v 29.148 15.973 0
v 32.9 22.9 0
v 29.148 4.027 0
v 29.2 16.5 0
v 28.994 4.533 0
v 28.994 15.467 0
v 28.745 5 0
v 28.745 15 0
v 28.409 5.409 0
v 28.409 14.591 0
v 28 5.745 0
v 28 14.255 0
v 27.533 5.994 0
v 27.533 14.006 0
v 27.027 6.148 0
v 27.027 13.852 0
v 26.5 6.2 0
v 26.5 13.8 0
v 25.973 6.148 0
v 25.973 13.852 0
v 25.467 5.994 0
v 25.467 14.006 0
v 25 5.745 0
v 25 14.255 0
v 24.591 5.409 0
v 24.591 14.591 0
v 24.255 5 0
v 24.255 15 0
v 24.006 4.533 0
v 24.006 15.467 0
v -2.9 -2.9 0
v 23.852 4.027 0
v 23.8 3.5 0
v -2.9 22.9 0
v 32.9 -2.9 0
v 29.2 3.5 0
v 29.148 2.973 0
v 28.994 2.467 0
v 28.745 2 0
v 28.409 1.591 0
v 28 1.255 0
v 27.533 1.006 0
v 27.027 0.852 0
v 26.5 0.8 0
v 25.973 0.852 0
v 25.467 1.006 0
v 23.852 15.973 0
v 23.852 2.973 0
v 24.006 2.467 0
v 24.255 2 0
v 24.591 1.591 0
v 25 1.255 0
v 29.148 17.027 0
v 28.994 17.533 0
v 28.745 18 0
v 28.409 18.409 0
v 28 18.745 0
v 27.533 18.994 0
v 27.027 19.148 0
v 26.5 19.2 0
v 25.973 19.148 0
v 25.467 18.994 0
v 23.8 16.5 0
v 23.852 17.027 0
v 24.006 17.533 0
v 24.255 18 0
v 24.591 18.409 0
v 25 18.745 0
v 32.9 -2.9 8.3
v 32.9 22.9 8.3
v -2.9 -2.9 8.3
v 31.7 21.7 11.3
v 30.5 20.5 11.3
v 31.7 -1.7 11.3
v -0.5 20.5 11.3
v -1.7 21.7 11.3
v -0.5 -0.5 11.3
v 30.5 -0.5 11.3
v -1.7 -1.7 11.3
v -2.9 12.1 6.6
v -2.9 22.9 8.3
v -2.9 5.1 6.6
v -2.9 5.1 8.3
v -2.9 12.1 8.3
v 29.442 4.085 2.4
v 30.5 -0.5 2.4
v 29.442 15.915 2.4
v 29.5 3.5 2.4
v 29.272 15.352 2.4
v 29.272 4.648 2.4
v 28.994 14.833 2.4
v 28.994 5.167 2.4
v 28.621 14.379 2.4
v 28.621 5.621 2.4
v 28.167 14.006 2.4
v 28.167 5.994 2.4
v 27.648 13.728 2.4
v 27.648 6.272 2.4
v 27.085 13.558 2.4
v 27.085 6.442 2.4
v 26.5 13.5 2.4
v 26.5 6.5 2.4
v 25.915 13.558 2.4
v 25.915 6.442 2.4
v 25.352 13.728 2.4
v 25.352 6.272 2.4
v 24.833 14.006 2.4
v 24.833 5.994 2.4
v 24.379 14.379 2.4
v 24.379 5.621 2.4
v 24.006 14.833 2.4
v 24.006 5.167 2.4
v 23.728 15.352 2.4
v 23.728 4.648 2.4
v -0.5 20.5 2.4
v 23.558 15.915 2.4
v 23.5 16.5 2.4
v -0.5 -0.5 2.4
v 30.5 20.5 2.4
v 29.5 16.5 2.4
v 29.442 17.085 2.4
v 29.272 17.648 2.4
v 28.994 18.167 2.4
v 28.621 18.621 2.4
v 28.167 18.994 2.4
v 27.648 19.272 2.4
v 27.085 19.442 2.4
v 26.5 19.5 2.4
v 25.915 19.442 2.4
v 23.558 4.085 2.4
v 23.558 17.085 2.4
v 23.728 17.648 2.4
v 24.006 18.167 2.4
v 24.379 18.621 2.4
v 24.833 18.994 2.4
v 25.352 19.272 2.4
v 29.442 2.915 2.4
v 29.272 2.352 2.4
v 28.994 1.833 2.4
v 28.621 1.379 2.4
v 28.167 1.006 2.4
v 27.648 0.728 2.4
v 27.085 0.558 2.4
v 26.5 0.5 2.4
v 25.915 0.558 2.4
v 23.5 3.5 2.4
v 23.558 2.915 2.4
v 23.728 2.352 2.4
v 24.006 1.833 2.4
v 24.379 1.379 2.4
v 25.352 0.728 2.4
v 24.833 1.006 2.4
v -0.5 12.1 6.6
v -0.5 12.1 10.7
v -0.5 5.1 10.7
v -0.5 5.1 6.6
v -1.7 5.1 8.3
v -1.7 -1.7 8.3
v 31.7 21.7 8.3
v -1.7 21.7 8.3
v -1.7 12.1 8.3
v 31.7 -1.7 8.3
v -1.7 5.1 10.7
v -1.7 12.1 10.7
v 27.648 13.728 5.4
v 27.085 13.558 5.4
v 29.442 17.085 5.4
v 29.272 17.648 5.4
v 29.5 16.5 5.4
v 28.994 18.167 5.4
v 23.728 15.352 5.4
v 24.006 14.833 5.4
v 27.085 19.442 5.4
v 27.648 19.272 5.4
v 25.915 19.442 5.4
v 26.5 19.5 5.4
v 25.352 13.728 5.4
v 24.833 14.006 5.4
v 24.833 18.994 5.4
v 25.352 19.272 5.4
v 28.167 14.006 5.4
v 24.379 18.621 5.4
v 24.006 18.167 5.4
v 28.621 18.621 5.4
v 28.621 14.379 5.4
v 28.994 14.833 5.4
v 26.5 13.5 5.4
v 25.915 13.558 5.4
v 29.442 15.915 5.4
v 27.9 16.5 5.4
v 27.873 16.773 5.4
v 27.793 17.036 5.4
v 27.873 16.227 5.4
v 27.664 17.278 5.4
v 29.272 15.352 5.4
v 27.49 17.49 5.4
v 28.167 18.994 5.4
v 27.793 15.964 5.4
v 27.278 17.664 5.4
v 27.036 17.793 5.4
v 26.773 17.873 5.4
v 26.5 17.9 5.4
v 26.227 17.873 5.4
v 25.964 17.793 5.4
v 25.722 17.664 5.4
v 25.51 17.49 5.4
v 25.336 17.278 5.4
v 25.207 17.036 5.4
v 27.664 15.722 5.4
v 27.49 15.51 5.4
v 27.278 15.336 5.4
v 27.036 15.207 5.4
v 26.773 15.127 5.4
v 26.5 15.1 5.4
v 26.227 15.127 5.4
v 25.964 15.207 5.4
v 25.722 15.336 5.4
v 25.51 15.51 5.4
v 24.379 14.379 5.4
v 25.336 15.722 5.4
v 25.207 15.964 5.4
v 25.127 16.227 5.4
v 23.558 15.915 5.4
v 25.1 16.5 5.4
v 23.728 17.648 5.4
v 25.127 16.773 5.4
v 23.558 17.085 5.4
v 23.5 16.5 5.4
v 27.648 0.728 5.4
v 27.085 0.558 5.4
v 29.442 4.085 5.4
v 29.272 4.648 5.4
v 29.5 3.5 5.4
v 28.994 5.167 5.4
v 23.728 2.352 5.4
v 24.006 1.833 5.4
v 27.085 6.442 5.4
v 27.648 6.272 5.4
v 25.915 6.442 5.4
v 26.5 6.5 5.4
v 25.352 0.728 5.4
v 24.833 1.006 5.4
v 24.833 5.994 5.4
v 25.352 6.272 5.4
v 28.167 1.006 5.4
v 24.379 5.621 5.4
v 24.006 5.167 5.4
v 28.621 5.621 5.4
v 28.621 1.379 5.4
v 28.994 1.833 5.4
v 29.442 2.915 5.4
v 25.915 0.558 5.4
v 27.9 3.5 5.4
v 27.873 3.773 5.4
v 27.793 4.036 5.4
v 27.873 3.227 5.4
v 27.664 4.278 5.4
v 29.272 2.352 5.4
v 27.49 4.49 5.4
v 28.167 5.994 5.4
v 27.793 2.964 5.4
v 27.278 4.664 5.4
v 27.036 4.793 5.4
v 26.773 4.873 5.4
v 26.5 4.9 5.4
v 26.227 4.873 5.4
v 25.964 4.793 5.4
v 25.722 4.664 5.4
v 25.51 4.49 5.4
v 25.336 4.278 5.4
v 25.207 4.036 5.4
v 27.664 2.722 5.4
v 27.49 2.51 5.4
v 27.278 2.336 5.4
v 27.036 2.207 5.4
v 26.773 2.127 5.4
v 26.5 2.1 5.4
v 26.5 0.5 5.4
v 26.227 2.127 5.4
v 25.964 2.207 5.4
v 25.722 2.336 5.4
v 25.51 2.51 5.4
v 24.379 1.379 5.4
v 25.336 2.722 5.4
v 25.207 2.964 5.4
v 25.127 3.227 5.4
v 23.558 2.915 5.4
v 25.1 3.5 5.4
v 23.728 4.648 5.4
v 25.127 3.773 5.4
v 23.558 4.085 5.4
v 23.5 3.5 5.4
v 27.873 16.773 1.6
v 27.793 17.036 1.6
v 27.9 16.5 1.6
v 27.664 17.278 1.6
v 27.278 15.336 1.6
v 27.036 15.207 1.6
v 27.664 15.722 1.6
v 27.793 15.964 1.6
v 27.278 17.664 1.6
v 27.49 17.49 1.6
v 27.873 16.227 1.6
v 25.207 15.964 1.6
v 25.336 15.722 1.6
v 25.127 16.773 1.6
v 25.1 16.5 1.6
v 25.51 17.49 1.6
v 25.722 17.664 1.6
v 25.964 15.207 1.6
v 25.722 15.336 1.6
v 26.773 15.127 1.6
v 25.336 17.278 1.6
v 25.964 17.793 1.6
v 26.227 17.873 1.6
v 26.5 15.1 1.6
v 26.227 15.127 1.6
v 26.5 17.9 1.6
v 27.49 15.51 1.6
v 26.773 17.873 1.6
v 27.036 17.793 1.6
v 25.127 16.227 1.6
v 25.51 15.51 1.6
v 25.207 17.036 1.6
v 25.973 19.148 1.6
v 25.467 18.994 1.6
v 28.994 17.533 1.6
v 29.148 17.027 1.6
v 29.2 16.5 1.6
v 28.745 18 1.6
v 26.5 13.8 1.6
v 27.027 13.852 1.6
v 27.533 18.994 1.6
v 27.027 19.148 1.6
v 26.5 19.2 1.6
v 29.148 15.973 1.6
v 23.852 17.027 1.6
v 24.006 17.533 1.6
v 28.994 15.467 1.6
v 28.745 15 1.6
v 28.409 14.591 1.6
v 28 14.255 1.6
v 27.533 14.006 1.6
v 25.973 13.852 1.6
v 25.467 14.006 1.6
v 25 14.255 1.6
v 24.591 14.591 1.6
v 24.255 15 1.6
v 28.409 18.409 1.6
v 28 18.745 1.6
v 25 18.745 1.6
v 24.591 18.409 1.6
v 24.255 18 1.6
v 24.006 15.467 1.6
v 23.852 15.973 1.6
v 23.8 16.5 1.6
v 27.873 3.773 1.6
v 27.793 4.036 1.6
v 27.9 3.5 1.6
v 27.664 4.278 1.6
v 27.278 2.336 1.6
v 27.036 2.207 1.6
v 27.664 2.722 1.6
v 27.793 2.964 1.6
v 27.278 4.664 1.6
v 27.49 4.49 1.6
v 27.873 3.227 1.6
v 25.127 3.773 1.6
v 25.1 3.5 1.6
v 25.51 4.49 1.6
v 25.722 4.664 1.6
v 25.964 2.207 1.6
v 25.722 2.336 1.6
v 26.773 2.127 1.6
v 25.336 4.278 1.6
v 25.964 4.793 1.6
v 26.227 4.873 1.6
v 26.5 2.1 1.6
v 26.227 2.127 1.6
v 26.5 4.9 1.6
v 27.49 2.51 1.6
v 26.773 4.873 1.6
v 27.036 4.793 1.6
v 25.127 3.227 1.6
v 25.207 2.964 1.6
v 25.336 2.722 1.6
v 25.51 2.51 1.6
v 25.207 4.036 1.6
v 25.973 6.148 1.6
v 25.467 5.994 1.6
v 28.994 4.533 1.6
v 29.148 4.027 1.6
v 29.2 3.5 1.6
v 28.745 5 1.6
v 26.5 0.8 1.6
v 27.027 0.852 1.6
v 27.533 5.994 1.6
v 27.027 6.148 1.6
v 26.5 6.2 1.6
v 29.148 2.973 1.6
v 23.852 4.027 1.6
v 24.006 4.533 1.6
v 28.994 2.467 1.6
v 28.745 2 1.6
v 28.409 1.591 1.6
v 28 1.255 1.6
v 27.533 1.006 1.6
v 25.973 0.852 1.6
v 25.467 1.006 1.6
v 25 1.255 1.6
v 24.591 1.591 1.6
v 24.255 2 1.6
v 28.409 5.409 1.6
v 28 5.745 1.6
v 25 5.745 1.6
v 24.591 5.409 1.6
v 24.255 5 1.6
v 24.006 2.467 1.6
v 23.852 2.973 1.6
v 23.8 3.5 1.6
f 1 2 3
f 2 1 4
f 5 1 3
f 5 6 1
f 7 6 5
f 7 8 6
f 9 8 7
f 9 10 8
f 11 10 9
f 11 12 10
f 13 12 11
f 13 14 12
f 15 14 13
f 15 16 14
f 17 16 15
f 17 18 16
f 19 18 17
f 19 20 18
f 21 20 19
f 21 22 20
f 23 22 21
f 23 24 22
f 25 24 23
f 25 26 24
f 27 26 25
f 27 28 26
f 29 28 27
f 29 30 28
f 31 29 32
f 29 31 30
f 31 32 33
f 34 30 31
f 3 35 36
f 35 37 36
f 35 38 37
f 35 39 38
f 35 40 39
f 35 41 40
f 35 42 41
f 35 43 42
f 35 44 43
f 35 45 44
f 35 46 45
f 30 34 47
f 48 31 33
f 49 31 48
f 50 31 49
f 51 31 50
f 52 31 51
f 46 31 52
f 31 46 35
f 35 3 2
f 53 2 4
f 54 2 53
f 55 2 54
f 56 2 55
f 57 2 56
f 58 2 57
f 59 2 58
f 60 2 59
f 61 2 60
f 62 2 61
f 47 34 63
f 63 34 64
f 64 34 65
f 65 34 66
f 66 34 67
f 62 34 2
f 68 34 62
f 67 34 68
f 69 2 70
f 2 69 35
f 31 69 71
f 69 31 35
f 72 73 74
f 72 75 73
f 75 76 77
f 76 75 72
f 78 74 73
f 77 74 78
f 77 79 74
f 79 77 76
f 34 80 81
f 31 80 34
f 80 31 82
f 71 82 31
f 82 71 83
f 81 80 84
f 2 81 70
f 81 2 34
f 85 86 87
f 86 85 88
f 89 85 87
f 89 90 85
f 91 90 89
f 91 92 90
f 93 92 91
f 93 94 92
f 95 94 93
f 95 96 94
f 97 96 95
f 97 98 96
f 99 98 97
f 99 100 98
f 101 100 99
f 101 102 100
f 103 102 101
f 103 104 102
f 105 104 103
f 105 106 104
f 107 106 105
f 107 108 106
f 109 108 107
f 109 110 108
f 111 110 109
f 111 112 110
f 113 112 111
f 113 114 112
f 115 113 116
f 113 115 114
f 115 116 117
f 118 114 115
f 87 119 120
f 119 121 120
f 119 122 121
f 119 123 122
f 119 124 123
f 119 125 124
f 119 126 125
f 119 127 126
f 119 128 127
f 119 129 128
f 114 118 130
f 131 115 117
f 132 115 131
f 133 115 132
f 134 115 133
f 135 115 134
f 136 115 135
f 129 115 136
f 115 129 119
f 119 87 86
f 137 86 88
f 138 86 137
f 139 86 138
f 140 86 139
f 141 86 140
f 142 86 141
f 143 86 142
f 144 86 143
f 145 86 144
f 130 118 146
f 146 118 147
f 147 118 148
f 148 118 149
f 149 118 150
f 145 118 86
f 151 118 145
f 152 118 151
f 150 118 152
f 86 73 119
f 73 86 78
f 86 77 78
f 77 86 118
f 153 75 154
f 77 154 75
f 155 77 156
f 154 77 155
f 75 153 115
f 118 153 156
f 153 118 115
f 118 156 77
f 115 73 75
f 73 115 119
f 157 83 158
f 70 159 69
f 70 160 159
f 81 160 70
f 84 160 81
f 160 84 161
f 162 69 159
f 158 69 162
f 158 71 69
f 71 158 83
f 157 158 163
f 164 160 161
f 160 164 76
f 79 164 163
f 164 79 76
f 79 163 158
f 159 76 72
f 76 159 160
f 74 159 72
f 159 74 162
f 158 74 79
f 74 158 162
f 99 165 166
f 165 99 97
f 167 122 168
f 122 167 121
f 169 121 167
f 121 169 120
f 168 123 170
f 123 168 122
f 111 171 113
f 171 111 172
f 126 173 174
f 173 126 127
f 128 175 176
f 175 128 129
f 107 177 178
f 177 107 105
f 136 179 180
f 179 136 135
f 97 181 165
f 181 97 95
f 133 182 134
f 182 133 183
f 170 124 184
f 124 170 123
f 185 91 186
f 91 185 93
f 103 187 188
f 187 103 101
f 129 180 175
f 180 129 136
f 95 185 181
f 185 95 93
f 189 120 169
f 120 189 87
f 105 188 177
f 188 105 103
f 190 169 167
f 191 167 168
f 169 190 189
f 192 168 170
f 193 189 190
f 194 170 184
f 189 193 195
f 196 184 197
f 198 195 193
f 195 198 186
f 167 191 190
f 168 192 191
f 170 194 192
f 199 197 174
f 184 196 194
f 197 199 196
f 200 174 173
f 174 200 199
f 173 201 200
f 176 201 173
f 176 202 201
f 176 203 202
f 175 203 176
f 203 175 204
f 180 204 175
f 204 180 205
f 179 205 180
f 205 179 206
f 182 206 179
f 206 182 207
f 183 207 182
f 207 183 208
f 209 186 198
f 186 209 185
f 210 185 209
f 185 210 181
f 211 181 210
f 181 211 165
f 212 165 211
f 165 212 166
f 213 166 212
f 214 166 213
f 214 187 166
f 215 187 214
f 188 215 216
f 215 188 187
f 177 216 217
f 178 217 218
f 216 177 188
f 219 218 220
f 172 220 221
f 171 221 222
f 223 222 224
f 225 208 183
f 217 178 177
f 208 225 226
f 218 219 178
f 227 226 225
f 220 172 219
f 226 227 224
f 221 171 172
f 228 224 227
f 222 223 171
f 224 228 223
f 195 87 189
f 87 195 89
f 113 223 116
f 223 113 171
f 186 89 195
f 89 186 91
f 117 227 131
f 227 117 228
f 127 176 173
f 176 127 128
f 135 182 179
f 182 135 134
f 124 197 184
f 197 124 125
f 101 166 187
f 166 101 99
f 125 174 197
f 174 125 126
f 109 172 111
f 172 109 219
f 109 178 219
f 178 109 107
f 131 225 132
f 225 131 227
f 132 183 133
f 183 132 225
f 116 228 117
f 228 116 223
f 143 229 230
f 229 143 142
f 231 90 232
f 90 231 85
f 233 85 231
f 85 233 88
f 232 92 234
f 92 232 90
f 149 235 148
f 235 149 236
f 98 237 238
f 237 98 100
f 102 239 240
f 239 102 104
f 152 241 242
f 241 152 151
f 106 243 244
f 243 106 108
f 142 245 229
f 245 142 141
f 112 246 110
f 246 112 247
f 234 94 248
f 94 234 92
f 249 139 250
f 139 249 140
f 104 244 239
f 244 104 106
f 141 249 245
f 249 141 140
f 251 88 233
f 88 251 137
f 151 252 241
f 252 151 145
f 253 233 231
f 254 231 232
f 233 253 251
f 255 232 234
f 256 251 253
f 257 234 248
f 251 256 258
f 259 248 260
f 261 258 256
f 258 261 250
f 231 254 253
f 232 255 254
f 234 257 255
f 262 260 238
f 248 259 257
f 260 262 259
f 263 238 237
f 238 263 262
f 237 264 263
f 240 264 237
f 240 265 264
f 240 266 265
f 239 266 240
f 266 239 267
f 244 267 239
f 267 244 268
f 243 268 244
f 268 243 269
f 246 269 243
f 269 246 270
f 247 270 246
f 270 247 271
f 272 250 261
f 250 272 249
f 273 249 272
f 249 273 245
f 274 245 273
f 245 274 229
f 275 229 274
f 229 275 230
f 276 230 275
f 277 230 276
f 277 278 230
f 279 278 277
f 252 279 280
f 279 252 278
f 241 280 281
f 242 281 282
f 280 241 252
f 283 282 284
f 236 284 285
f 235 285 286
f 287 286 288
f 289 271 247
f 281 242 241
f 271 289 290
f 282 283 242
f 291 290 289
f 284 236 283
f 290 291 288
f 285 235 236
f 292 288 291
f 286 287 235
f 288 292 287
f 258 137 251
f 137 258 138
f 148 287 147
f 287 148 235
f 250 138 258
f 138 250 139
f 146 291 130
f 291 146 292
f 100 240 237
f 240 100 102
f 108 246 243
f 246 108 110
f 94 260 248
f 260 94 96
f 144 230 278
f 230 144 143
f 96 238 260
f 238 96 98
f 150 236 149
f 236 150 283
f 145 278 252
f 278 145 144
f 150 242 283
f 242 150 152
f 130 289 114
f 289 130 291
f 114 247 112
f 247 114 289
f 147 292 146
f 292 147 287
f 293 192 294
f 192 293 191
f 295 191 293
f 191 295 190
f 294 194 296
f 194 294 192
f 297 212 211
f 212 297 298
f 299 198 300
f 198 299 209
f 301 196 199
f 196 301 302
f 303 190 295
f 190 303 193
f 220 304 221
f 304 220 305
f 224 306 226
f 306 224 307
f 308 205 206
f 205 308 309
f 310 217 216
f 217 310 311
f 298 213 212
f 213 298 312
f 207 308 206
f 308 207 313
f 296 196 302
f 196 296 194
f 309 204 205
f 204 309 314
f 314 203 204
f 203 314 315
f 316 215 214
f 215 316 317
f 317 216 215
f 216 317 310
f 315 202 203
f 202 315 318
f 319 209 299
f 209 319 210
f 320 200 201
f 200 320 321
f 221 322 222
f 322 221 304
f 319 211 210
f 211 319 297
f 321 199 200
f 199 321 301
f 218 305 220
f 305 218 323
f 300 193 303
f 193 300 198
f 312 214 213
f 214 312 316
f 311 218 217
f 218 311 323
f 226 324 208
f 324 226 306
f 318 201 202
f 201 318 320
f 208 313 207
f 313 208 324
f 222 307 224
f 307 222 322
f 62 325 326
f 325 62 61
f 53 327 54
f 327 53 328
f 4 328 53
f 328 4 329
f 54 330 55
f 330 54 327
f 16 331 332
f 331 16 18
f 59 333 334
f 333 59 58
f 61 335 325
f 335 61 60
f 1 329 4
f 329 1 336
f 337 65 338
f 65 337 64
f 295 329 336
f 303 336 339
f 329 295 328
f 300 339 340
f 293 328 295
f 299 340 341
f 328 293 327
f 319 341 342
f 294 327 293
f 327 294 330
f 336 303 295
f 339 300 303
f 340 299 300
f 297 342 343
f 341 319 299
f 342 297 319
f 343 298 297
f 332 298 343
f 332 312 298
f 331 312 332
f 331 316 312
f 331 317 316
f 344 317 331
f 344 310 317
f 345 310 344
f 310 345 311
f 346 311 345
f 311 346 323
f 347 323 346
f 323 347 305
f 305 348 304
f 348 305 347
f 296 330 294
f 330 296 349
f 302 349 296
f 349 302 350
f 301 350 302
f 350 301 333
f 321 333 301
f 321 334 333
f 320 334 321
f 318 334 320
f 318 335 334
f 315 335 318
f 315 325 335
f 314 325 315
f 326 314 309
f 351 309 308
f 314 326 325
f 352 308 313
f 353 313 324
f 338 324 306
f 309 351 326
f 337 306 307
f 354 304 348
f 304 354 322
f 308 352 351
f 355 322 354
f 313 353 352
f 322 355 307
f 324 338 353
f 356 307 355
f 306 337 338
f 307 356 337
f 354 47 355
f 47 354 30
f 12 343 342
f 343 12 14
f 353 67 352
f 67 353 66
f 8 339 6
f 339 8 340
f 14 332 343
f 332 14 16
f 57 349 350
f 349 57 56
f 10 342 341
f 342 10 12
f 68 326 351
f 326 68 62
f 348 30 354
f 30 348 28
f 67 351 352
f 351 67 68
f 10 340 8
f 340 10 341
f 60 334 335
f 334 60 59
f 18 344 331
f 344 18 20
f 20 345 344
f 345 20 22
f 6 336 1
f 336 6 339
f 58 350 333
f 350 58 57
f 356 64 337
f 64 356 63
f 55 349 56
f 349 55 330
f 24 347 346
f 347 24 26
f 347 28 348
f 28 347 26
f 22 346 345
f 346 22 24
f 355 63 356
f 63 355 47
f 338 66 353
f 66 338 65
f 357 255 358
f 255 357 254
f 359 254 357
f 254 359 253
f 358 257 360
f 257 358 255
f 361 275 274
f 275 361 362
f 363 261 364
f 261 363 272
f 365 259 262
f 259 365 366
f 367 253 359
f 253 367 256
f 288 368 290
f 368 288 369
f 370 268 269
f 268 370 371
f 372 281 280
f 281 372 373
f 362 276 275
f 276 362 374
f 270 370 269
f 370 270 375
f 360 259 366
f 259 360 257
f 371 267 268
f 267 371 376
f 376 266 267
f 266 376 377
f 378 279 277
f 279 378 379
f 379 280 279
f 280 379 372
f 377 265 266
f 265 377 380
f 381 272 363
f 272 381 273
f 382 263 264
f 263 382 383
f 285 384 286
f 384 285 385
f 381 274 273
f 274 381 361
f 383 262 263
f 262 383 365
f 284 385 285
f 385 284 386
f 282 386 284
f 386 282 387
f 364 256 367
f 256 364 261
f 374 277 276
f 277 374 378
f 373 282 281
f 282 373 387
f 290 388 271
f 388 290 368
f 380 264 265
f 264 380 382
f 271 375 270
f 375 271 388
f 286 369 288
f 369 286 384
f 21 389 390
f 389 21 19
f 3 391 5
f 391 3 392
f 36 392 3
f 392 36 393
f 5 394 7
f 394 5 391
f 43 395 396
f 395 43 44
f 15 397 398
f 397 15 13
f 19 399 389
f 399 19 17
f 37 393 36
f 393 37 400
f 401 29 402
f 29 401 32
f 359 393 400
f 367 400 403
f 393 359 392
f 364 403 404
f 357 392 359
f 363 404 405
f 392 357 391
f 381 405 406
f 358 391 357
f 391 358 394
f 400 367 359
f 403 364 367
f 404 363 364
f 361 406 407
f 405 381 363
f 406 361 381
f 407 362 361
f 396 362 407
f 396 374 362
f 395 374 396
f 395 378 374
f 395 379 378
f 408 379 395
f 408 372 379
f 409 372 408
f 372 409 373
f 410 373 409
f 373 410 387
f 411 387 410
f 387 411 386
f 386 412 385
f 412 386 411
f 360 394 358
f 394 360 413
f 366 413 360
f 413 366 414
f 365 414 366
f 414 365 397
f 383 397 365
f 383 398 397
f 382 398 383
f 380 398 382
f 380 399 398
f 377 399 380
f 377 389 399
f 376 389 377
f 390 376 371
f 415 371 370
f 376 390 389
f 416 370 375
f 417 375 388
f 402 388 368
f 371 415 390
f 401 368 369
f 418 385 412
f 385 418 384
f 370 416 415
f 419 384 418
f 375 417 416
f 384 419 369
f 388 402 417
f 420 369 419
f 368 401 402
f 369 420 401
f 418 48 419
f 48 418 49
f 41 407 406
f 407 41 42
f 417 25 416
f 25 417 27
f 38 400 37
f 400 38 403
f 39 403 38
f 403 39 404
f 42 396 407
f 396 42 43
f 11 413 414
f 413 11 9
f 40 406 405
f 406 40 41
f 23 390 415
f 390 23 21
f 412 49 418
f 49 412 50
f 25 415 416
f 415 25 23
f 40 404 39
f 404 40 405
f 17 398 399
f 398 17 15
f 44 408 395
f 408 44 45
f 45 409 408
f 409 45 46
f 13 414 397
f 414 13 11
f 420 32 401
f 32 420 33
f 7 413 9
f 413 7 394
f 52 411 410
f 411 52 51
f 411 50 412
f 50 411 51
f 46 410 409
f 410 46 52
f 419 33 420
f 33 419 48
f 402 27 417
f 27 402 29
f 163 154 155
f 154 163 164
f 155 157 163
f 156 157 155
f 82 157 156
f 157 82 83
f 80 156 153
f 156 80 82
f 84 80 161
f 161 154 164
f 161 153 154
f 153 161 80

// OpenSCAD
// The base of the housing "usbc_screwed", written by enclosure-nv 0.1.0
// from the board file usbc_board.kicad_pcb.  Render with OpenSCAD.
// Parameters, in millimetres.  The same block heads every file of this housing:
// when a value is changed, change it in each file.
wall = 2.4;
floor_t = 2.4;
lid_t = 1.6;
clear = 0.5;  // the board's edge to the inside of the wall
standoff_d = 6;
screw_d = 2.5;
pilot_d = 2.1;
head_d = 5;
head_h = 1.6;
lip_h = 3;  // the height of the step the lid sits on
lid_gap = 0.2;
snap_depth = 0.4;
snap_h = 0.8;
led_d = 3;
button_d = 3;
board_t = 1.6;
standoff_h = 3;  // the space under the board
top_space = 4.3;  // the space above the board
pilot_len = 3.5;  // the depth of the screw's hole
print_flip = false;  // true lays the lid plate down

// Levels along z.
z_bb = floor_t + standoff_h;
z_bt = z_bb + board_t;
z_split = z_bt + top_space;
z_step = z_split - lip_h;
z_top = z_split + lid_t;
z_skirt = z_step + lid_gap;
a_in = wall / 2;
screw_clear = screw_d + 0.3;

module outline() {
  polygon(points = [[0, 0], [30, 0], [30, 20], [0, 20]]);
}

module base() {
  difference() {
    union() {
      difference() {
        linear_extrude(height = z_split) offset(delta = clear + wall) outline();
        translate([0, 0, floor_t]) linear_extrude(height = z_split) offset(delta = clear) outline();
        translate([0, 0, z_step]) linear_extrude(height = z_split) difference() {
          offset(delta = clear + wall + 1) outline();
          offset(delta = clear + a_in) outline();
        }
      }
      // the standoffs
      translate([26.5, 16.5, floor_t / 2]) cylinder(h = z_bb - floor_t / 2, d = standoff_d, $fn = 32);
      translate([26.5, 3.5, floor_t / 2]) cylinder(h = z_bb - floor_t / 2, d = standoff_d, $fn = 32);
    }
    // the screw holes, through the standoff and the floor, with a recess for the head
    translate([26.5, 16.5, -1]) cylinder(h = z_bb + 2, d = screw_clear, $fn = 32);
    translate([26.5, 16.5, -1]) cylinder(h = head_h + 1, d = head_d + 0.4, $fn = 32);
    translate([26.5, 3.5, -1]) cylinder(h = z_bb + 2, d = screw_clear, $fn = 32);
    translate([26.5, 3.5, -1]) cylinder(h = head_h + 1, d = head_d + 0.4, $fn = 32);
    // the openings
    translate([0, 8.6, z_bt + (-0.4)]) rotate([0, 0, 180]) translate([-1, -3.5, 0]) cube([clear + wall + 2, 7, 4.1]);
  }
}

base();
